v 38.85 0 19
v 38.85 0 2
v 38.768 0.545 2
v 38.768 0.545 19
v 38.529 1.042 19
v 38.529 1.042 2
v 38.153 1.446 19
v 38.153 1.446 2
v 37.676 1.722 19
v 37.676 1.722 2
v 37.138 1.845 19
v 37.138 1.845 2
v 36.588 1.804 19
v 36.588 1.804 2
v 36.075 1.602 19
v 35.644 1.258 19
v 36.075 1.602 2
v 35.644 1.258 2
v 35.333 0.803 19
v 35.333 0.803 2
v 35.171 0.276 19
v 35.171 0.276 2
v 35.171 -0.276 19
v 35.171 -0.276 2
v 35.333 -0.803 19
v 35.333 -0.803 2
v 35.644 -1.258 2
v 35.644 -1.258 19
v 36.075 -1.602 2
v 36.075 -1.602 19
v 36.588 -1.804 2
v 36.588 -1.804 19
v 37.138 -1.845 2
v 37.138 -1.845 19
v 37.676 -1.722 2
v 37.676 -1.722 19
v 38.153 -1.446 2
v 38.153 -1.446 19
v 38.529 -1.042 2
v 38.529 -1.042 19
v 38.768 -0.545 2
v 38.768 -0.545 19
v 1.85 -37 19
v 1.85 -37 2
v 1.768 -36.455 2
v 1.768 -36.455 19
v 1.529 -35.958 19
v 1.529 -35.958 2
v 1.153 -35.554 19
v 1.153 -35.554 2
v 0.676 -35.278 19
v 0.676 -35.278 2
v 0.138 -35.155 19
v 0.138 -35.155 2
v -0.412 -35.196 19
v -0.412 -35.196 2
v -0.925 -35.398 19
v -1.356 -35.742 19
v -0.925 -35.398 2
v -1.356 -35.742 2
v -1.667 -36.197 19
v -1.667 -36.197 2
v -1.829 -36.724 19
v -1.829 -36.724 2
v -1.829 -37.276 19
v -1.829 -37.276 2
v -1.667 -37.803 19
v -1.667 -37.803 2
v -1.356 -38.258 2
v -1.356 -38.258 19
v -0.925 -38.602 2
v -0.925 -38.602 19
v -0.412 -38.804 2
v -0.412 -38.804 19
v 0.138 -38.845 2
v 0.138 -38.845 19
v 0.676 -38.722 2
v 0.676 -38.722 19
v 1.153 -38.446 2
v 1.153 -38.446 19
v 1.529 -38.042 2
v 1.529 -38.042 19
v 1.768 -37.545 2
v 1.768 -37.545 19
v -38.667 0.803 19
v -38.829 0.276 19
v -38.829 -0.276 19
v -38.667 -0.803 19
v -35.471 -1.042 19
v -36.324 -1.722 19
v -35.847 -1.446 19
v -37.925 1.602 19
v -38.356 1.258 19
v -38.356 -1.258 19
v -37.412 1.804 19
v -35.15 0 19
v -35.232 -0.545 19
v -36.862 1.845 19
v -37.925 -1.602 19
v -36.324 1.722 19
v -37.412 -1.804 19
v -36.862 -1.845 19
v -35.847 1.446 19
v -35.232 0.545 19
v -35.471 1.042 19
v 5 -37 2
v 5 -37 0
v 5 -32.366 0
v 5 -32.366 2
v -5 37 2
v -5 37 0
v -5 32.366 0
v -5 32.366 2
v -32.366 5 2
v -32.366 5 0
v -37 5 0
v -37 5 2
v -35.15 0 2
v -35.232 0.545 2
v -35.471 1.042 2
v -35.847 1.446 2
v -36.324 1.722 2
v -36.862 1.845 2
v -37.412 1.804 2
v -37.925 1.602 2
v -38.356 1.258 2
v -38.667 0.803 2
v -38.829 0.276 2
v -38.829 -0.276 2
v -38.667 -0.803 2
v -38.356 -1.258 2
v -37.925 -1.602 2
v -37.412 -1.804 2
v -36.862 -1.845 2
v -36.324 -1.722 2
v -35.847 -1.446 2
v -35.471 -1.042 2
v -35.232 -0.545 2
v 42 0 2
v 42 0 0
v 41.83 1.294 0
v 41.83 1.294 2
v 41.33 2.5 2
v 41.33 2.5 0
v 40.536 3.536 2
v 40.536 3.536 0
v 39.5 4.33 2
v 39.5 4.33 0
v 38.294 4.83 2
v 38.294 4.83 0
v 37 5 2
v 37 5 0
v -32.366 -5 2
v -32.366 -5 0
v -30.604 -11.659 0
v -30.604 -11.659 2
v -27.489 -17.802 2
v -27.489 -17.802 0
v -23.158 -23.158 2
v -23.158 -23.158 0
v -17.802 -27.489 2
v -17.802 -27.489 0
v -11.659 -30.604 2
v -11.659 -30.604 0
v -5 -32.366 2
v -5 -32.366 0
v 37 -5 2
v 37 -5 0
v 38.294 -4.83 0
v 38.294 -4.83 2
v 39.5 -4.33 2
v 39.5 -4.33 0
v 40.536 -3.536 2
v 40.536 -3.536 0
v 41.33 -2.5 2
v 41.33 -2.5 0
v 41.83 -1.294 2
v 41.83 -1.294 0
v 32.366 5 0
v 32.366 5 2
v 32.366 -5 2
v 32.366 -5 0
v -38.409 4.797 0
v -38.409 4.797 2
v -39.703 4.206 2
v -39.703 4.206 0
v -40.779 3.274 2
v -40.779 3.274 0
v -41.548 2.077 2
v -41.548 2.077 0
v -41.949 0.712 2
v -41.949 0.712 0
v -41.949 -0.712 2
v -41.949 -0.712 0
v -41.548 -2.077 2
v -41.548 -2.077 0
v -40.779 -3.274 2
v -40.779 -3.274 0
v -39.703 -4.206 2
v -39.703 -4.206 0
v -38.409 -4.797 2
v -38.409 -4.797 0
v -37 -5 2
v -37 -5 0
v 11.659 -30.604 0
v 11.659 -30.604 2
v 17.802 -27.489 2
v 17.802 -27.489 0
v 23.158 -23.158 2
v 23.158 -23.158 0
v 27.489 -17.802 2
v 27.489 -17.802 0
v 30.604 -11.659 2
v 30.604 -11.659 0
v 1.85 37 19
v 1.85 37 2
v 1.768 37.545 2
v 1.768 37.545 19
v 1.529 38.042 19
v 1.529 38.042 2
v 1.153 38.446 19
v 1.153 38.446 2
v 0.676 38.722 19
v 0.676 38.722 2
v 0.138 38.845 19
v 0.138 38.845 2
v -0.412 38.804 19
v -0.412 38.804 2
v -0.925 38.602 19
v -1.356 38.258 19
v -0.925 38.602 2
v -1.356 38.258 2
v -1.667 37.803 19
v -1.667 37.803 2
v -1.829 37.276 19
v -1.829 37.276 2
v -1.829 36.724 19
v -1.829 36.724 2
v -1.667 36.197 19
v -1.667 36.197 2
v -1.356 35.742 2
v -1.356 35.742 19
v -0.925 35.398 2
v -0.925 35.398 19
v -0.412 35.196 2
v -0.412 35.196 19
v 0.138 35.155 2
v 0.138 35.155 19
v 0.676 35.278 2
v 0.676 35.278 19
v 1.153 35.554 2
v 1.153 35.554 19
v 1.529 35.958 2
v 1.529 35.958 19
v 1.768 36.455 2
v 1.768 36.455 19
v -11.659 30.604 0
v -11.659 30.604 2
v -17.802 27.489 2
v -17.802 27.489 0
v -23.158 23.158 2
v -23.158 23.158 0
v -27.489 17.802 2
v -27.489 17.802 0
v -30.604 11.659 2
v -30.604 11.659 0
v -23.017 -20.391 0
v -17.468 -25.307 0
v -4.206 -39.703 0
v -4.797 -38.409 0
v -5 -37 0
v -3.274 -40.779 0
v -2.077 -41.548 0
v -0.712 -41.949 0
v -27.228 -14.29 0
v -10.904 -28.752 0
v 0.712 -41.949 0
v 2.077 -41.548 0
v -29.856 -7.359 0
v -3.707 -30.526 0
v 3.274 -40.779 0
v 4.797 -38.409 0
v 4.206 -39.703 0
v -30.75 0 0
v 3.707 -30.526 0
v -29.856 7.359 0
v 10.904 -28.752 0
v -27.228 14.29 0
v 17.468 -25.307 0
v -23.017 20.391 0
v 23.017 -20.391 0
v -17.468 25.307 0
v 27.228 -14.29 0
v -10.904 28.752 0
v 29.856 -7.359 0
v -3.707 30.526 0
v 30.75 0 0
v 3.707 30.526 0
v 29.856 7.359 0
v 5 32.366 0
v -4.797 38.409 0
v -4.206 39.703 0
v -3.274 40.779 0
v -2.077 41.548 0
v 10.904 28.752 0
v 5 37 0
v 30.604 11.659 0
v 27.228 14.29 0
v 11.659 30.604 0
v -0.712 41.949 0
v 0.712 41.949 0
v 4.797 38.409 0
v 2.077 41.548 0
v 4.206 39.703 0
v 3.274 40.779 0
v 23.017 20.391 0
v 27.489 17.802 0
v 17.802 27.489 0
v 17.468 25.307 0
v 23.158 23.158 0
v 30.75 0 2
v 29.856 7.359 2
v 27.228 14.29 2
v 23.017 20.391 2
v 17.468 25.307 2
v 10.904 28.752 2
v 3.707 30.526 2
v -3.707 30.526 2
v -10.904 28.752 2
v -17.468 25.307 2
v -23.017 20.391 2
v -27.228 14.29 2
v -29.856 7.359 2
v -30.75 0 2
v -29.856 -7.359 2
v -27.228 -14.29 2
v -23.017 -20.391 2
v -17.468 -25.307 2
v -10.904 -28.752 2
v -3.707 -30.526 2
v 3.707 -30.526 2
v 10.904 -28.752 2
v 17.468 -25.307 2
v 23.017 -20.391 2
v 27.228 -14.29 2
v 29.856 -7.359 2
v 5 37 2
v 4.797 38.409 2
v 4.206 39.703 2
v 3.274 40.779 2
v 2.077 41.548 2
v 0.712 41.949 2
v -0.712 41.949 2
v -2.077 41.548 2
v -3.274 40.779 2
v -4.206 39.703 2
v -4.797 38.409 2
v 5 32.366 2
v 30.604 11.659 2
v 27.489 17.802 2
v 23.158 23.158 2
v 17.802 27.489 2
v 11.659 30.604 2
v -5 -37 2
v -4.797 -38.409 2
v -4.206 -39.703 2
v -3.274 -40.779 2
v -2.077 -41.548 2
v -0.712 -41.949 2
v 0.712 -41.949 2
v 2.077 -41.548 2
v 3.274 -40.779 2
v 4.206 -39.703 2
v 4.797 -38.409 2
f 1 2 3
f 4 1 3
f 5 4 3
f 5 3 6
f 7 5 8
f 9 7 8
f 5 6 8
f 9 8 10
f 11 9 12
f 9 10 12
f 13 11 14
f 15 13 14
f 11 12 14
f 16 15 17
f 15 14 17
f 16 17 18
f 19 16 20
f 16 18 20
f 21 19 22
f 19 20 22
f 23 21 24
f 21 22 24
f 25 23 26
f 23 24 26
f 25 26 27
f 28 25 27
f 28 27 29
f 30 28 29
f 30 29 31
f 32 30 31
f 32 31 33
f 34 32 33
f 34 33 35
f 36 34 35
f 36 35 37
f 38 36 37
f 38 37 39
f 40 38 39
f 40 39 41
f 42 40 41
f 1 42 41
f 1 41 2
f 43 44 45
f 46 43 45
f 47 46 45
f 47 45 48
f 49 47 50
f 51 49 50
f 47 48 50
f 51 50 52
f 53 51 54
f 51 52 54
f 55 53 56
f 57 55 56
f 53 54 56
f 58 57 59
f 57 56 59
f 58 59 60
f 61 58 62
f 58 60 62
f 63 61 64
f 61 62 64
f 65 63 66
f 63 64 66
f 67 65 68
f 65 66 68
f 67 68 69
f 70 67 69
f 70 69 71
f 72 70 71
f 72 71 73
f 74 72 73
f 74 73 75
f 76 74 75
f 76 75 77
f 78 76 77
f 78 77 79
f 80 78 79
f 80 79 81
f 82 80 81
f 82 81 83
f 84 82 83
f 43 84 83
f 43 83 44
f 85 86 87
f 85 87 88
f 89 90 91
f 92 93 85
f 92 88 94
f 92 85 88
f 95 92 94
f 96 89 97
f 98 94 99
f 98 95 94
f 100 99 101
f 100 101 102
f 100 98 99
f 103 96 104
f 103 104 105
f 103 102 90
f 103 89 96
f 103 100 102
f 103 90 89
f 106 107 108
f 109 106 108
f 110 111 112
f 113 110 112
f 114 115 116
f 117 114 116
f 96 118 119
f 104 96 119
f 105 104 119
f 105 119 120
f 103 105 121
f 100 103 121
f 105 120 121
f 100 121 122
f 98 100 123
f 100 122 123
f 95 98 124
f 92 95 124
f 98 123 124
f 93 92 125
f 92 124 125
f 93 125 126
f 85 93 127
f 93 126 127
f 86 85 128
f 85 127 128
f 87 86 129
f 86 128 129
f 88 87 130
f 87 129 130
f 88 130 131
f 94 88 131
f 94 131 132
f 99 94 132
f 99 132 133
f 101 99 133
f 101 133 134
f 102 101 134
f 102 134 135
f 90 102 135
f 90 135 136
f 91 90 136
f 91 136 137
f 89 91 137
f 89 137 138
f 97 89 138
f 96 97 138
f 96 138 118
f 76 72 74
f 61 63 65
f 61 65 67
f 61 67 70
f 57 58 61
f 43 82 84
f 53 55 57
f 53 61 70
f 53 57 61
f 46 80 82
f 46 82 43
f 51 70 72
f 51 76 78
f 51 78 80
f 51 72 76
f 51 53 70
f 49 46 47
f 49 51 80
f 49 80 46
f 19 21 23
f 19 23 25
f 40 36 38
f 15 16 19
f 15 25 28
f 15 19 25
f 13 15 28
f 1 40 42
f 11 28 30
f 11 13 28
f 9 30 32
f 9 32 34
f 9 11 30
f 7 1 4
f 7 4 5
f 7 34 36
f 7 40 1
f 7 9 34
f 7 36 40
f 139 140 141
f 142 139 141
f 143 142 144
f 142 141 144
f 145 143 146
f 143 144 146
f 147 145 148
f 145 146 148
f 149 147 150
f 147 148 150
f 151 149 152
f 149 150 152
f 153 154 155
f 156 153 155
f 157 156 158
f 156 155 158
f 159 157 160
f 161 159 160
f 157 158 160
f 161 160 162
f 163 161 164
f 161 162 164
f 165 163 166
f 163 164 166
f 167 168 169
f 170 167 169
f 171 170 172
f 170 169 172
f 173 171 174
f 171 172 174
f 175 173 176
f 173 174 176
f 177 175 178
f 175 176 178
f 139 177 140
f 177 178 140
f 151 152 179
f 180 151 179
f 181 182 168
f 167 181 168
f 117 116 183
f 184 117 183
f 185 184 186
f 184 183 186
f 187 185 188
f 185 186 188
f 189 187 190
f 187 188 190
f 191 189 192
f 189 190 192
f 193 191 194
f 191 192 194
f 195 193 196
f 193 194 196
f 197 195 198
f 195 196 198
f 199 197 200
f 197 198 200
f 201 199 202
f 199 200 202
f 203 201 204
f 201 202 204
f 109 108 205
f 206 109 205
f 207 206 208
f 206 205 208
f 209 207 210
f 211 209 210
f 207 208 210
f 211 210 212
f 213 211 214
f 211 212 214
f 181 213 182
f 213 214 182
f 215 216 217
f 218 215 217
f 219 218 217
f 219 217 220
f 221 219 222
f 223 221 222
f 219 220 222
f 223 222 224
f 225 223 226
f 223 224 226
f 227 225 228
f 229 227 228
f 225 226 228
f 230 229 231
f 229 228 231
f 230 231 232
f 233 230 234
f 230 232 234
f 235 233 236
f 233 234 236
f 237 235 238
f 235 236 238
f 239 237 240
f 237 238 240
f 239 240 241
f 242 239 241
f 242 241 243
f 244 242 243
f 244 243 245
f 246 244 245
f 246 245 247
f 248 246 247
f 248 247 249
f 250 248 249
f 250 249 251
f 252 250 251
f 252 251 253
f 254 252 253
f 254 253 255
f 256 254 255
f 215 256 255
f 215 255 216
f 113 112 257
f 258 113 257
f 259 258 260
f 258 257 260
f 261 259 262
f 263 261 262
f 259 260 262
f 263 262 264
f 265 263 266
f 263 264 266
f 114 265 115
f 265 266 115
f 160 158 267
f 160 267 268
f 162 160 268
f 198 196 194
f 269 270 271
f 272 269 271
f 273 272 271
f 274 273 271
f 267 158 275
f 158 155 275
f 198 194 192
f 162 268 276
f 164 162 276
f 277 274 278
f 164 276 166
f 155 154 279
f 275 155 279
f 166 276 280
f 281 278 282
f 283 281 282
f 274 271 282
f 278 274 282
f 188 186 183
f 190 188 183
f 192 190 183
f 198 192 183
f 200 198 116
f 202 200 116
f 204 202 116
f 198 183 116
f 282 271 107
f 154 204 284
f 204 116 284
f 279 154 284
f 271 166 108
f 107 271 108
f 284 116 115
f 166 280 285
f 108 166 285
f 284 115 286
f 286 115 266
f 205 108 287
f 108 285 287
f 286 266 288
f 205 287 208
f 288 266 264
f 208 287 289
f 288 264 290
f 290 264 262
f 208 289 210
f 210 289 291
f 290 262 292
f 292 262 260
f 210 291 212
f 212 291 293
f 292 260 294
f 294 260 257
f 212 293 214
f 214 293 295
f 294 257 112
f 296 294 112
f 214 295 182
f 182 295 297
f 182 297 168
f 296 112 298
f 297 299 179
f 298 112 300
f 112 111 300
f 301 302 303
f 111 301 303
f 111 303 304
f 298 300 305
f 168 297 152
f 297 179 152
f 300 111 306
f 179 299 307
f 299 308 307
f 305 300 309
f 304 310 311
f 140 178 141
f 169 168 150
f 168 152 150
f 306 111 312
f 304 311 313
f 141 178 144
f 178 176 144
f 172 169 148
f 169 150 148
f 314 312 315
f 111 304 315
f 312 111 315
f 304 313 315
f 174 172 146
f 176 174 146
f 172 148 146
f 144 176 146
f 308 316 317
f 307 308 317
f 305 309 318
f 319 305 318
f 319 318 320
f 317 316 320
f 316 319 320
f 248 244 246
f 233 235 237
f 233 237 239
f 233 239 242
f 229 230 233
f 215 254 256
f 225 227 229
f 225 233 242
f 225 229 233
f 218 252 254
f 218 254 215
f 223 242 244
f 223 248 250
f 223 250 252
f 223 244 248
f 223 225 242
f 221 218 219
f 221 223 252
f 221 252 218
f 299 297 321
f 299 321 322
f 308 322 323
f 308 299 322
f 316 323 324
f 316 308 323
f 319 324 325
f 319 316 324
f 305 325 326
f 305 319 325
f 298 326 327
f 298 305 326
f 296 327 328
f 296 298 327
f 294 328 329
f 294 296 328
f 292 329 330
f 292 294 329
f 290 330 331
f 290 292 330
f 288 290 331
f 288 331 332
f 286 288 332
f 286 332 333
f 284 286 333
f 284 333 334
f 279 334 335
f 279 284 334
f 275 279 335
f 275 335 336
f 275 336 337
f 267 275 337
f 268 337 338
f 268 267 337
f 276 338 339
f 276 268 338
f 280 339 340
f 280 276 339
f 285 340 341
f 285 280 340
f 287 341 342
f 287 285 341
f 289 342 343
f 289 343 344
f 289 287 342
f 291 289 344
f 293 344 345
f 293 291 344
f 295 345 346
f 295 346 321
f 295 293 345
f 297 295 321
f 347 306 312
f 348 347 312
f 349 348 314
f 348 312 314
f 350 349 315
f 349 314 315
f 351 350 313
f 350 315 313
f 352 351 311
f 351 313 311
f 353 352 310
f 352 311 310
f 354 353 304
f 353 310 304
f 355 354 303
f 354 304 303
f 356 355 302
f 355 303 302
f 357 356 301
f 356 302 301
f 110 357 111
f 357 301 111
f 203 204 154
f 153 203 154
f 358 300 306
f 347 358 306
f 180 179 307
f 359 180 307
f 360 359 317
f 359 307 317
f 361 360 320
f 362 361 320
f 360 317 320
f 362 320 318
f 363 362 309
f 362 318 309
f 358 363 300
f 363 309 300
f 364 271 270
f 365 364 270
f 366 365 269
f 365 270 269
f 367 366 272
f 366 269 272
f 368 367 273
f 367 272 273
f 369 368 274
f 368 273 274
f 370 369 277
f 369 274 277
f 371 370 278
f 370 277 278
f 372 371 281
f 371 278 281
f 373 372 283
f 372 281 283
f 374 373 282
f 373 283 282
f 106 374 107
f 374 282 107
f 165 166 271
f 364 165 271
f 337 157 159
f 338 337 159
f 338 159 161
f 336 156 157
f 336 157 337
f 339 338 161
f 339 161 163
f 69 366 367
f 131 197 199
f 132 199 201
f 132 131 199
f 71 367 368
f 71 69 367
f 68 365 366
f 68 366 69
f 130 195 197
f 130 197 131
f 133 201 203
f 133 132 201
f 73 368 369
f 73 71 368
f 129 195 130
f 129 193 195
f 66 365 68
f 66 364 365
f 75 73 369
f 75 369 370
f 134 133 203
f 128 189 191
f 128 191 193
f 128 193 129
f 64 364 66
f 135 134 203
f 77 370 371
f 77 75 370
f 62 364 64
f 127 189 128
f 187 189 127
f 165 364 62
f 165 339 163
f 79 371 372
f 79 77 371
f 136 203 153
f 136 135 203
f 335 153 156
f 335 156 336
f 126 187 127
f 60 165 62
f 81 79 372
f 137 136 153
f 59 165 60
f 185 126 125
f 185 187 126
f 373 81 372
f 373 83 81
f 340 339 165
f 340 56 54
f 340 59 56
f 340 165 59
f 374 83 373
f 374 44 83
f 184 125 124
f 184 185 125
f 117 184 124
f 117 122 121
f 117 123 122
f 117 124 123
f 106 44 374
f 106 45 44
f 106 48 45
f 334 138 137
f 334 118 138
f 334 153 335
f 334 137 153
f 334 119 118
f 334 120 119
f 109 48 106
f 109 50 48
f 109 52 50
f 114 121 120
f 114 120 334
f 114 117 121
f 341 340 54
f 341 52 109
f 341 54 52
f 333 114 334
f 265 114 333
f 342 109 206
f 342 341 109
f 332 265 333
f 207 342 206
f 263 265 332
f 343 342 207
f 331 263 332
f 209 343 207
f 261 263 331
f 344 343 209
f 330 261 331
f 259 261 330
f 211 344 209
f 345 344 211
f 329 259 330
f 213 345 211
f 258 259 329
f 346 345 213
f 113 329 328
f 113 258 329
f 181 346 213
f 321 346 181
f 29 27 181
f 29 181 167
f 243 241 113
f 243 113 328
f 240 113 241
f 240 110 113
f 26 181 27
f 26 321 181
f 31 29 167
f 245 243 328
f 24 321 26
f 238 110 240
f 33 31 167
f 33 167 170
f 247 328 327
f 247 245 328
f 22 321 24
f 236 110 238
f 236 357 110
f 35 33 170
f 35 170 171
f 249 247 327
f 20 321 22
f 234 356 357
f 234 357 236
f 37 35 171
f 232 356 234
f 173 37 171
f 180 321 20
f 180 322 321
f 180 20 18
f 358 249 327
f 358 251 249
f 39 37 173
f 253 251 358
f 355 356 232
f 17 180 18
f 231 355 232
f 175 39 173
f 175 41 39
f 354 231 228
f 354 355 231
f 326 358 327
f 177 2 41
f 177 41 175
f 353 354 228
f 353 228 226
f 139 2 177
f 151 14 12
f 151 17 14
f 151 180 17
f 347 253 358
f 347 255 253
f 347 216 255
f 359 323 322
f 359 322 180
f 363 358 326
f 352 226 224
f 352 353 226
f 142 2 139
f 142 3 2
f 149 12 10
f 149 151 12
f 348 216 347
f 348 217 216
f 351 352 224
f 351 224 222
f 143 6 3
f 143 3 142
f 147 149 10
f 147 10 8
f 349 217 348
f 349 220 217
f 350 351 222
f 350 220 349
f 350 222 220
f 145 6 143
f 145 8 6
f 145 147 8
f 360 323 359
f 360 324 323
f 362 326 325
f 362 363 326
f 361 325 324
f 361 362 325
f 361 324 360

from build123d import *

# Parameters (mm, degrees)
F0_R     = 30.75
F0_R_2   = 1.85
F1_DEPTH = 2
F2_DEPTH = 19


with BuildPart() as f1:
    # F0 (on Top) → F1 (new body)
    with BuildSketch(Plane.XY):
        with BuildLine():
            ThreePointArc((32.65625, 2.476254417), (32.5356397493, 3.7409418742), (32.366070197, 5))
            ThreePointArc((32.366070197, 5), (23.1577470839, 23.1577470839), (5, 32.366070197))
            ThreePointArc((5, 32.366070197), (3.7409418742, 32.5356397493), (2.476254417, 32.65625))
            ThreePointArc((2.476254417, 32.65625), (0, 32), (-2.476254417, 32.65625))
            ThreePointArc((-2.476254417, 32.65625), (-3.7409418742, 32.5356397493), (-5, 32.366070197))
            ThreePointArc((-5, 32.366070197), (-23.1577470839, 23.1577470839), (-32.366070197, 5))
            ThreePointArc((-32.366070197, 5), (-32.5356397493, 3.7409418742), (-32.65625, 2.476254417))
            ThreePointArc((-32.65625, 2.476254417), (-32.1668462677, 1.2808688457), (-32, 0))
            ThreePointArc((-32, 0), (-32.1668462677, -1.2808688457), (-32.65625, -2.476254417))
            ThreePointArc((-32.65625, -2.476254417), (-32.5356397493, -3.7409418742), (-32.366070197, -5))
            ThreePointArc((-32.366070197, -5), (-23.1577470839, -23.1577470839), (-5, -32.366070197))
            ThreePointArc((-5, -32.366070197), (-3.7409418742, -32.5356397493), (-2.476254417, -32.65625))
            ThreePointArc((-2.476254417, -32.65625), (0, -32), (2.476254417, -32.65625))
            ThreePointArc((2.476254417, -32.65625), (3.7409418742, -32.5356397493), (5, -32.366070197))
            ThreePointArc((5, -32.366070197), (23.1577470839, -23.1577470839), (32.366070197, -5))
            ThreePointArc((32.366070197, -5), (32.5356397493, -3.7409418742), (32.65625, -2.476254417))
            ThreePointArc((32.65625, -2.476254417), (32, 0), (32.65625, 2.476254417))
        make_face()
        Circle(F0_R, mode=Mode.SUBTRACT)
        with BuildLine():
            Line((37, 5), (32.366070197, 5))
            ThreePointArc((32.366070197, 5), (32.5356397493, 3.7409418742), (32.65625, 2.476254417))
            ThreePointArc((32.65625, 2.476254417), (34.488155268, 4.3232668253), (37, 5))
        make_face()
        with BuildLine():
            ThreePointArc((2.476254417, 32.65625), (3.7409418742, 32.5356397493), (5, 32.366070197))
            Line((5, 32.366070197), (5, 37))
            ThreePointArc((5, 37), (4.3232668253, 34.488155268), (2.476254417, 32.65625))
        make_face()
        with BuildLine():
            ThreePointArc((37, 5), (34.488155268, 4.3232668253), (32.65625, 2.476254417))
            ThreePointArc((32.65625, 2.476254417), (32.7265541075, 1.2390142251), (32.75, 0))
            ThreePointArc((32.75, 0), (32.7265541075, -1.2390142251), (32.65625, -2.476254417))
            ThreePointArc((32.65625, -2.476254417), (34.488155268, -4.3232668253), (37, -5))
            ThreePointArc((37, -5), (40.5355339059, -3.5355339059), (42, 0))
            ThreePointArc((42, 0), (40.5355339059, 3.5355339059), (37, 5))
        make_face()
        with Locations((37, 0)):
            Circle(F0_R_2, mode=Mode.SUBTRACT)
        with BuildLine():
            ThreePointArc((-2.476254417, 32.65625), (0, 32.75), (2.476254417, 32.65625))
            ThreePointArc((2.476254417, 32.65625), (4.3232668253, 34.488155268), (5, 37))
            ThreePointArc((5, 37), (0, 42), (-5, 37))
            ThreePointArc((-5, 37), (-4.3232668253, 34.488155268), (-2.476254417, 32.65625))
        make_face()
        with Locations((0, 37)):
            Circle(F0_R_2, mode=Mode.SUBTRACT)
        with BuildLine():
            ThreePointArc((37, -5), (34.488155268, -4.3232668253), (32.65625, -2.476254417))
            ThreePointArc((32.65625, -2.476254417), (32.5356397493, -3.7409418742), (32.366070197, -5))
            Line((32.366070197, -5), (37, -5))
        make_face()
        with BuildLine():
            ThreePointArc((-5, 32.366070197), (-3.7409418742, 32.5356397493), (-2.476254417, 32.65625))
            ThreePointArc((-2.476254417, 32.65625), (-4.3232668253, 34.488155268), (-5, 37))
            Line((-5, 37), (-5, 32.366070197))
        make_face()
        with BuildLine():
            Line((5, -37), (5, -32.366070197))
            ThreePointArc((5, -32.366070197), (3.7409418742, -32.5356397493), (2.476254417, -32.65625))
            ThreePointArc((2.476254417, -32.65625), (4.3232668253, -34.488155268), (5, -37))
        make_face()
        with BuildLine():
            ThreePointArc((-32.65625, 2.476254417), (-32.5356397493, 3.7409418742), (-32.366070197, 5))
            Line((-32.366070197, 5), (-37, 5))
            ThreePointArc((-37, 5), (-34.488155268, 4.3232668253), (-32.65625, 2.476254417))
        make_face()
        with BuildLine():
            ThreePointArc((5, -37), (4.3232668253, -34.488155268), (2.476254417, -32.65625))
            ThreePointArc((2.476254417, -32.65625), (0, -32.75), (-2.476254417, -32.65625))
            ThreePointArc((-2.476254417, -32.65625), (-4.3232668253, -34.488155268), (-5, -37))
            ThreePointArc((-5, -37), (0, -42), (5, -37))
        make_face()
        with Locations((0, -37)):
            Circle(F0_R_2, mode=Mode.SUBTRACT)
        with BuildLine():
            ThreePointArc((-32.65625, -2.476254417), (-32.75, 0), (-32.65625, 2.476254417))
            ThreePointArc((-32.65625, 2.476254417), (-34.488155268, 4.3232668253), (-37, 5))
            ThreePointArc((-37, 5), (-42, 0), (-37, -5))
            ThreePointArc((-37, -5), (-34.488155268, -4.3232668253), (-32.65625, -2.476254417))
        make_face()
        with Locations((-37, 0)):
            Circle(F0_R_2, mode=Mode.SUBTRACT)
        with BuildLine():
            ThreePointArc((-5, -37), (-4.3232668253, -34.488155268), (-2.476254417, -32.65625))
            ThreePointArc((-2.476254417, -32.65625), (-3.7409418742, -32.5356397493), (-5, -32.366070197))
            Line((-5, -32.366070197), (-5, -37))
        make_face()
        with BuildLine():
            ThreePointArc((-32.366070197, -5), (-32.5356397493, -3.7409418742), (-32.65625, -2.476254417))
            ThreePointArc((-32.65625, -2.476254417), (-34.488155268, -4.3232668253), (-37, -5))
            Line((-37, -5), (-32.366070197, -5))
        make_face()
        with BuildLine():
            ThreePointArc((-2.476254417, 32.65625), (0, 32), (2.476254417, 32.65625))
            ThreePointArc((2.476254417, 32.65625), (0, 32.75), (-2.476254417, 32.65625))
        make_face()
        with BuildLine():
            ThreePointArc((-32, 0), (-32.1668462677, 1.2808688457), (-32.65625, 2.476254417))
            ThreePointArc((-32.65625, 2.476254417), (-32.75, 0), (-32.65625, -2.476254417))
            ThreePointArc((-32.65625, -2.476254417), (-32.1668462677, -1.2808688457), (-32, 0))
        make_face()
        with BuildLine():
            ThreePointArc((-2.476254417, -32.65625), (0, -32.75), (2.476254417, -32.65625))
            ThreePointArc((2.476254417, -32.65625), (0, -32), (-2.476254417, -32.65625))
        make_face()
        with BuildLine():
            ThreePointArc((32.75, 0), (32.7265541075, 1.2390142251), (32.65625, 2.476254417))
            ThreePointArc((32.65625, 2.476254417), (32, 0), (32.65625, -2.476254417))
            ThreePointArc((32.65625, -2.476254417), (32.7265541075, -1.2390142251), (32.75, 0))
        make_face()
    extrude(amount=F1_DEPTH)

    # F0 (on Top) → F2 (join)
    with BuildSketch(Plane.XY):
        with Locations((0, 37)):
            Circle(F0_R_2)
        with Locations((-37, 0)):
            Circle(F0_R_2)
        with Locations((0, -37)):
            Circle(F0_R_2)
        with Locations((37, 0)):
            Circle(F0_R_2)
    extrude(amount=F2_DEPTH)


solid = f1.part
